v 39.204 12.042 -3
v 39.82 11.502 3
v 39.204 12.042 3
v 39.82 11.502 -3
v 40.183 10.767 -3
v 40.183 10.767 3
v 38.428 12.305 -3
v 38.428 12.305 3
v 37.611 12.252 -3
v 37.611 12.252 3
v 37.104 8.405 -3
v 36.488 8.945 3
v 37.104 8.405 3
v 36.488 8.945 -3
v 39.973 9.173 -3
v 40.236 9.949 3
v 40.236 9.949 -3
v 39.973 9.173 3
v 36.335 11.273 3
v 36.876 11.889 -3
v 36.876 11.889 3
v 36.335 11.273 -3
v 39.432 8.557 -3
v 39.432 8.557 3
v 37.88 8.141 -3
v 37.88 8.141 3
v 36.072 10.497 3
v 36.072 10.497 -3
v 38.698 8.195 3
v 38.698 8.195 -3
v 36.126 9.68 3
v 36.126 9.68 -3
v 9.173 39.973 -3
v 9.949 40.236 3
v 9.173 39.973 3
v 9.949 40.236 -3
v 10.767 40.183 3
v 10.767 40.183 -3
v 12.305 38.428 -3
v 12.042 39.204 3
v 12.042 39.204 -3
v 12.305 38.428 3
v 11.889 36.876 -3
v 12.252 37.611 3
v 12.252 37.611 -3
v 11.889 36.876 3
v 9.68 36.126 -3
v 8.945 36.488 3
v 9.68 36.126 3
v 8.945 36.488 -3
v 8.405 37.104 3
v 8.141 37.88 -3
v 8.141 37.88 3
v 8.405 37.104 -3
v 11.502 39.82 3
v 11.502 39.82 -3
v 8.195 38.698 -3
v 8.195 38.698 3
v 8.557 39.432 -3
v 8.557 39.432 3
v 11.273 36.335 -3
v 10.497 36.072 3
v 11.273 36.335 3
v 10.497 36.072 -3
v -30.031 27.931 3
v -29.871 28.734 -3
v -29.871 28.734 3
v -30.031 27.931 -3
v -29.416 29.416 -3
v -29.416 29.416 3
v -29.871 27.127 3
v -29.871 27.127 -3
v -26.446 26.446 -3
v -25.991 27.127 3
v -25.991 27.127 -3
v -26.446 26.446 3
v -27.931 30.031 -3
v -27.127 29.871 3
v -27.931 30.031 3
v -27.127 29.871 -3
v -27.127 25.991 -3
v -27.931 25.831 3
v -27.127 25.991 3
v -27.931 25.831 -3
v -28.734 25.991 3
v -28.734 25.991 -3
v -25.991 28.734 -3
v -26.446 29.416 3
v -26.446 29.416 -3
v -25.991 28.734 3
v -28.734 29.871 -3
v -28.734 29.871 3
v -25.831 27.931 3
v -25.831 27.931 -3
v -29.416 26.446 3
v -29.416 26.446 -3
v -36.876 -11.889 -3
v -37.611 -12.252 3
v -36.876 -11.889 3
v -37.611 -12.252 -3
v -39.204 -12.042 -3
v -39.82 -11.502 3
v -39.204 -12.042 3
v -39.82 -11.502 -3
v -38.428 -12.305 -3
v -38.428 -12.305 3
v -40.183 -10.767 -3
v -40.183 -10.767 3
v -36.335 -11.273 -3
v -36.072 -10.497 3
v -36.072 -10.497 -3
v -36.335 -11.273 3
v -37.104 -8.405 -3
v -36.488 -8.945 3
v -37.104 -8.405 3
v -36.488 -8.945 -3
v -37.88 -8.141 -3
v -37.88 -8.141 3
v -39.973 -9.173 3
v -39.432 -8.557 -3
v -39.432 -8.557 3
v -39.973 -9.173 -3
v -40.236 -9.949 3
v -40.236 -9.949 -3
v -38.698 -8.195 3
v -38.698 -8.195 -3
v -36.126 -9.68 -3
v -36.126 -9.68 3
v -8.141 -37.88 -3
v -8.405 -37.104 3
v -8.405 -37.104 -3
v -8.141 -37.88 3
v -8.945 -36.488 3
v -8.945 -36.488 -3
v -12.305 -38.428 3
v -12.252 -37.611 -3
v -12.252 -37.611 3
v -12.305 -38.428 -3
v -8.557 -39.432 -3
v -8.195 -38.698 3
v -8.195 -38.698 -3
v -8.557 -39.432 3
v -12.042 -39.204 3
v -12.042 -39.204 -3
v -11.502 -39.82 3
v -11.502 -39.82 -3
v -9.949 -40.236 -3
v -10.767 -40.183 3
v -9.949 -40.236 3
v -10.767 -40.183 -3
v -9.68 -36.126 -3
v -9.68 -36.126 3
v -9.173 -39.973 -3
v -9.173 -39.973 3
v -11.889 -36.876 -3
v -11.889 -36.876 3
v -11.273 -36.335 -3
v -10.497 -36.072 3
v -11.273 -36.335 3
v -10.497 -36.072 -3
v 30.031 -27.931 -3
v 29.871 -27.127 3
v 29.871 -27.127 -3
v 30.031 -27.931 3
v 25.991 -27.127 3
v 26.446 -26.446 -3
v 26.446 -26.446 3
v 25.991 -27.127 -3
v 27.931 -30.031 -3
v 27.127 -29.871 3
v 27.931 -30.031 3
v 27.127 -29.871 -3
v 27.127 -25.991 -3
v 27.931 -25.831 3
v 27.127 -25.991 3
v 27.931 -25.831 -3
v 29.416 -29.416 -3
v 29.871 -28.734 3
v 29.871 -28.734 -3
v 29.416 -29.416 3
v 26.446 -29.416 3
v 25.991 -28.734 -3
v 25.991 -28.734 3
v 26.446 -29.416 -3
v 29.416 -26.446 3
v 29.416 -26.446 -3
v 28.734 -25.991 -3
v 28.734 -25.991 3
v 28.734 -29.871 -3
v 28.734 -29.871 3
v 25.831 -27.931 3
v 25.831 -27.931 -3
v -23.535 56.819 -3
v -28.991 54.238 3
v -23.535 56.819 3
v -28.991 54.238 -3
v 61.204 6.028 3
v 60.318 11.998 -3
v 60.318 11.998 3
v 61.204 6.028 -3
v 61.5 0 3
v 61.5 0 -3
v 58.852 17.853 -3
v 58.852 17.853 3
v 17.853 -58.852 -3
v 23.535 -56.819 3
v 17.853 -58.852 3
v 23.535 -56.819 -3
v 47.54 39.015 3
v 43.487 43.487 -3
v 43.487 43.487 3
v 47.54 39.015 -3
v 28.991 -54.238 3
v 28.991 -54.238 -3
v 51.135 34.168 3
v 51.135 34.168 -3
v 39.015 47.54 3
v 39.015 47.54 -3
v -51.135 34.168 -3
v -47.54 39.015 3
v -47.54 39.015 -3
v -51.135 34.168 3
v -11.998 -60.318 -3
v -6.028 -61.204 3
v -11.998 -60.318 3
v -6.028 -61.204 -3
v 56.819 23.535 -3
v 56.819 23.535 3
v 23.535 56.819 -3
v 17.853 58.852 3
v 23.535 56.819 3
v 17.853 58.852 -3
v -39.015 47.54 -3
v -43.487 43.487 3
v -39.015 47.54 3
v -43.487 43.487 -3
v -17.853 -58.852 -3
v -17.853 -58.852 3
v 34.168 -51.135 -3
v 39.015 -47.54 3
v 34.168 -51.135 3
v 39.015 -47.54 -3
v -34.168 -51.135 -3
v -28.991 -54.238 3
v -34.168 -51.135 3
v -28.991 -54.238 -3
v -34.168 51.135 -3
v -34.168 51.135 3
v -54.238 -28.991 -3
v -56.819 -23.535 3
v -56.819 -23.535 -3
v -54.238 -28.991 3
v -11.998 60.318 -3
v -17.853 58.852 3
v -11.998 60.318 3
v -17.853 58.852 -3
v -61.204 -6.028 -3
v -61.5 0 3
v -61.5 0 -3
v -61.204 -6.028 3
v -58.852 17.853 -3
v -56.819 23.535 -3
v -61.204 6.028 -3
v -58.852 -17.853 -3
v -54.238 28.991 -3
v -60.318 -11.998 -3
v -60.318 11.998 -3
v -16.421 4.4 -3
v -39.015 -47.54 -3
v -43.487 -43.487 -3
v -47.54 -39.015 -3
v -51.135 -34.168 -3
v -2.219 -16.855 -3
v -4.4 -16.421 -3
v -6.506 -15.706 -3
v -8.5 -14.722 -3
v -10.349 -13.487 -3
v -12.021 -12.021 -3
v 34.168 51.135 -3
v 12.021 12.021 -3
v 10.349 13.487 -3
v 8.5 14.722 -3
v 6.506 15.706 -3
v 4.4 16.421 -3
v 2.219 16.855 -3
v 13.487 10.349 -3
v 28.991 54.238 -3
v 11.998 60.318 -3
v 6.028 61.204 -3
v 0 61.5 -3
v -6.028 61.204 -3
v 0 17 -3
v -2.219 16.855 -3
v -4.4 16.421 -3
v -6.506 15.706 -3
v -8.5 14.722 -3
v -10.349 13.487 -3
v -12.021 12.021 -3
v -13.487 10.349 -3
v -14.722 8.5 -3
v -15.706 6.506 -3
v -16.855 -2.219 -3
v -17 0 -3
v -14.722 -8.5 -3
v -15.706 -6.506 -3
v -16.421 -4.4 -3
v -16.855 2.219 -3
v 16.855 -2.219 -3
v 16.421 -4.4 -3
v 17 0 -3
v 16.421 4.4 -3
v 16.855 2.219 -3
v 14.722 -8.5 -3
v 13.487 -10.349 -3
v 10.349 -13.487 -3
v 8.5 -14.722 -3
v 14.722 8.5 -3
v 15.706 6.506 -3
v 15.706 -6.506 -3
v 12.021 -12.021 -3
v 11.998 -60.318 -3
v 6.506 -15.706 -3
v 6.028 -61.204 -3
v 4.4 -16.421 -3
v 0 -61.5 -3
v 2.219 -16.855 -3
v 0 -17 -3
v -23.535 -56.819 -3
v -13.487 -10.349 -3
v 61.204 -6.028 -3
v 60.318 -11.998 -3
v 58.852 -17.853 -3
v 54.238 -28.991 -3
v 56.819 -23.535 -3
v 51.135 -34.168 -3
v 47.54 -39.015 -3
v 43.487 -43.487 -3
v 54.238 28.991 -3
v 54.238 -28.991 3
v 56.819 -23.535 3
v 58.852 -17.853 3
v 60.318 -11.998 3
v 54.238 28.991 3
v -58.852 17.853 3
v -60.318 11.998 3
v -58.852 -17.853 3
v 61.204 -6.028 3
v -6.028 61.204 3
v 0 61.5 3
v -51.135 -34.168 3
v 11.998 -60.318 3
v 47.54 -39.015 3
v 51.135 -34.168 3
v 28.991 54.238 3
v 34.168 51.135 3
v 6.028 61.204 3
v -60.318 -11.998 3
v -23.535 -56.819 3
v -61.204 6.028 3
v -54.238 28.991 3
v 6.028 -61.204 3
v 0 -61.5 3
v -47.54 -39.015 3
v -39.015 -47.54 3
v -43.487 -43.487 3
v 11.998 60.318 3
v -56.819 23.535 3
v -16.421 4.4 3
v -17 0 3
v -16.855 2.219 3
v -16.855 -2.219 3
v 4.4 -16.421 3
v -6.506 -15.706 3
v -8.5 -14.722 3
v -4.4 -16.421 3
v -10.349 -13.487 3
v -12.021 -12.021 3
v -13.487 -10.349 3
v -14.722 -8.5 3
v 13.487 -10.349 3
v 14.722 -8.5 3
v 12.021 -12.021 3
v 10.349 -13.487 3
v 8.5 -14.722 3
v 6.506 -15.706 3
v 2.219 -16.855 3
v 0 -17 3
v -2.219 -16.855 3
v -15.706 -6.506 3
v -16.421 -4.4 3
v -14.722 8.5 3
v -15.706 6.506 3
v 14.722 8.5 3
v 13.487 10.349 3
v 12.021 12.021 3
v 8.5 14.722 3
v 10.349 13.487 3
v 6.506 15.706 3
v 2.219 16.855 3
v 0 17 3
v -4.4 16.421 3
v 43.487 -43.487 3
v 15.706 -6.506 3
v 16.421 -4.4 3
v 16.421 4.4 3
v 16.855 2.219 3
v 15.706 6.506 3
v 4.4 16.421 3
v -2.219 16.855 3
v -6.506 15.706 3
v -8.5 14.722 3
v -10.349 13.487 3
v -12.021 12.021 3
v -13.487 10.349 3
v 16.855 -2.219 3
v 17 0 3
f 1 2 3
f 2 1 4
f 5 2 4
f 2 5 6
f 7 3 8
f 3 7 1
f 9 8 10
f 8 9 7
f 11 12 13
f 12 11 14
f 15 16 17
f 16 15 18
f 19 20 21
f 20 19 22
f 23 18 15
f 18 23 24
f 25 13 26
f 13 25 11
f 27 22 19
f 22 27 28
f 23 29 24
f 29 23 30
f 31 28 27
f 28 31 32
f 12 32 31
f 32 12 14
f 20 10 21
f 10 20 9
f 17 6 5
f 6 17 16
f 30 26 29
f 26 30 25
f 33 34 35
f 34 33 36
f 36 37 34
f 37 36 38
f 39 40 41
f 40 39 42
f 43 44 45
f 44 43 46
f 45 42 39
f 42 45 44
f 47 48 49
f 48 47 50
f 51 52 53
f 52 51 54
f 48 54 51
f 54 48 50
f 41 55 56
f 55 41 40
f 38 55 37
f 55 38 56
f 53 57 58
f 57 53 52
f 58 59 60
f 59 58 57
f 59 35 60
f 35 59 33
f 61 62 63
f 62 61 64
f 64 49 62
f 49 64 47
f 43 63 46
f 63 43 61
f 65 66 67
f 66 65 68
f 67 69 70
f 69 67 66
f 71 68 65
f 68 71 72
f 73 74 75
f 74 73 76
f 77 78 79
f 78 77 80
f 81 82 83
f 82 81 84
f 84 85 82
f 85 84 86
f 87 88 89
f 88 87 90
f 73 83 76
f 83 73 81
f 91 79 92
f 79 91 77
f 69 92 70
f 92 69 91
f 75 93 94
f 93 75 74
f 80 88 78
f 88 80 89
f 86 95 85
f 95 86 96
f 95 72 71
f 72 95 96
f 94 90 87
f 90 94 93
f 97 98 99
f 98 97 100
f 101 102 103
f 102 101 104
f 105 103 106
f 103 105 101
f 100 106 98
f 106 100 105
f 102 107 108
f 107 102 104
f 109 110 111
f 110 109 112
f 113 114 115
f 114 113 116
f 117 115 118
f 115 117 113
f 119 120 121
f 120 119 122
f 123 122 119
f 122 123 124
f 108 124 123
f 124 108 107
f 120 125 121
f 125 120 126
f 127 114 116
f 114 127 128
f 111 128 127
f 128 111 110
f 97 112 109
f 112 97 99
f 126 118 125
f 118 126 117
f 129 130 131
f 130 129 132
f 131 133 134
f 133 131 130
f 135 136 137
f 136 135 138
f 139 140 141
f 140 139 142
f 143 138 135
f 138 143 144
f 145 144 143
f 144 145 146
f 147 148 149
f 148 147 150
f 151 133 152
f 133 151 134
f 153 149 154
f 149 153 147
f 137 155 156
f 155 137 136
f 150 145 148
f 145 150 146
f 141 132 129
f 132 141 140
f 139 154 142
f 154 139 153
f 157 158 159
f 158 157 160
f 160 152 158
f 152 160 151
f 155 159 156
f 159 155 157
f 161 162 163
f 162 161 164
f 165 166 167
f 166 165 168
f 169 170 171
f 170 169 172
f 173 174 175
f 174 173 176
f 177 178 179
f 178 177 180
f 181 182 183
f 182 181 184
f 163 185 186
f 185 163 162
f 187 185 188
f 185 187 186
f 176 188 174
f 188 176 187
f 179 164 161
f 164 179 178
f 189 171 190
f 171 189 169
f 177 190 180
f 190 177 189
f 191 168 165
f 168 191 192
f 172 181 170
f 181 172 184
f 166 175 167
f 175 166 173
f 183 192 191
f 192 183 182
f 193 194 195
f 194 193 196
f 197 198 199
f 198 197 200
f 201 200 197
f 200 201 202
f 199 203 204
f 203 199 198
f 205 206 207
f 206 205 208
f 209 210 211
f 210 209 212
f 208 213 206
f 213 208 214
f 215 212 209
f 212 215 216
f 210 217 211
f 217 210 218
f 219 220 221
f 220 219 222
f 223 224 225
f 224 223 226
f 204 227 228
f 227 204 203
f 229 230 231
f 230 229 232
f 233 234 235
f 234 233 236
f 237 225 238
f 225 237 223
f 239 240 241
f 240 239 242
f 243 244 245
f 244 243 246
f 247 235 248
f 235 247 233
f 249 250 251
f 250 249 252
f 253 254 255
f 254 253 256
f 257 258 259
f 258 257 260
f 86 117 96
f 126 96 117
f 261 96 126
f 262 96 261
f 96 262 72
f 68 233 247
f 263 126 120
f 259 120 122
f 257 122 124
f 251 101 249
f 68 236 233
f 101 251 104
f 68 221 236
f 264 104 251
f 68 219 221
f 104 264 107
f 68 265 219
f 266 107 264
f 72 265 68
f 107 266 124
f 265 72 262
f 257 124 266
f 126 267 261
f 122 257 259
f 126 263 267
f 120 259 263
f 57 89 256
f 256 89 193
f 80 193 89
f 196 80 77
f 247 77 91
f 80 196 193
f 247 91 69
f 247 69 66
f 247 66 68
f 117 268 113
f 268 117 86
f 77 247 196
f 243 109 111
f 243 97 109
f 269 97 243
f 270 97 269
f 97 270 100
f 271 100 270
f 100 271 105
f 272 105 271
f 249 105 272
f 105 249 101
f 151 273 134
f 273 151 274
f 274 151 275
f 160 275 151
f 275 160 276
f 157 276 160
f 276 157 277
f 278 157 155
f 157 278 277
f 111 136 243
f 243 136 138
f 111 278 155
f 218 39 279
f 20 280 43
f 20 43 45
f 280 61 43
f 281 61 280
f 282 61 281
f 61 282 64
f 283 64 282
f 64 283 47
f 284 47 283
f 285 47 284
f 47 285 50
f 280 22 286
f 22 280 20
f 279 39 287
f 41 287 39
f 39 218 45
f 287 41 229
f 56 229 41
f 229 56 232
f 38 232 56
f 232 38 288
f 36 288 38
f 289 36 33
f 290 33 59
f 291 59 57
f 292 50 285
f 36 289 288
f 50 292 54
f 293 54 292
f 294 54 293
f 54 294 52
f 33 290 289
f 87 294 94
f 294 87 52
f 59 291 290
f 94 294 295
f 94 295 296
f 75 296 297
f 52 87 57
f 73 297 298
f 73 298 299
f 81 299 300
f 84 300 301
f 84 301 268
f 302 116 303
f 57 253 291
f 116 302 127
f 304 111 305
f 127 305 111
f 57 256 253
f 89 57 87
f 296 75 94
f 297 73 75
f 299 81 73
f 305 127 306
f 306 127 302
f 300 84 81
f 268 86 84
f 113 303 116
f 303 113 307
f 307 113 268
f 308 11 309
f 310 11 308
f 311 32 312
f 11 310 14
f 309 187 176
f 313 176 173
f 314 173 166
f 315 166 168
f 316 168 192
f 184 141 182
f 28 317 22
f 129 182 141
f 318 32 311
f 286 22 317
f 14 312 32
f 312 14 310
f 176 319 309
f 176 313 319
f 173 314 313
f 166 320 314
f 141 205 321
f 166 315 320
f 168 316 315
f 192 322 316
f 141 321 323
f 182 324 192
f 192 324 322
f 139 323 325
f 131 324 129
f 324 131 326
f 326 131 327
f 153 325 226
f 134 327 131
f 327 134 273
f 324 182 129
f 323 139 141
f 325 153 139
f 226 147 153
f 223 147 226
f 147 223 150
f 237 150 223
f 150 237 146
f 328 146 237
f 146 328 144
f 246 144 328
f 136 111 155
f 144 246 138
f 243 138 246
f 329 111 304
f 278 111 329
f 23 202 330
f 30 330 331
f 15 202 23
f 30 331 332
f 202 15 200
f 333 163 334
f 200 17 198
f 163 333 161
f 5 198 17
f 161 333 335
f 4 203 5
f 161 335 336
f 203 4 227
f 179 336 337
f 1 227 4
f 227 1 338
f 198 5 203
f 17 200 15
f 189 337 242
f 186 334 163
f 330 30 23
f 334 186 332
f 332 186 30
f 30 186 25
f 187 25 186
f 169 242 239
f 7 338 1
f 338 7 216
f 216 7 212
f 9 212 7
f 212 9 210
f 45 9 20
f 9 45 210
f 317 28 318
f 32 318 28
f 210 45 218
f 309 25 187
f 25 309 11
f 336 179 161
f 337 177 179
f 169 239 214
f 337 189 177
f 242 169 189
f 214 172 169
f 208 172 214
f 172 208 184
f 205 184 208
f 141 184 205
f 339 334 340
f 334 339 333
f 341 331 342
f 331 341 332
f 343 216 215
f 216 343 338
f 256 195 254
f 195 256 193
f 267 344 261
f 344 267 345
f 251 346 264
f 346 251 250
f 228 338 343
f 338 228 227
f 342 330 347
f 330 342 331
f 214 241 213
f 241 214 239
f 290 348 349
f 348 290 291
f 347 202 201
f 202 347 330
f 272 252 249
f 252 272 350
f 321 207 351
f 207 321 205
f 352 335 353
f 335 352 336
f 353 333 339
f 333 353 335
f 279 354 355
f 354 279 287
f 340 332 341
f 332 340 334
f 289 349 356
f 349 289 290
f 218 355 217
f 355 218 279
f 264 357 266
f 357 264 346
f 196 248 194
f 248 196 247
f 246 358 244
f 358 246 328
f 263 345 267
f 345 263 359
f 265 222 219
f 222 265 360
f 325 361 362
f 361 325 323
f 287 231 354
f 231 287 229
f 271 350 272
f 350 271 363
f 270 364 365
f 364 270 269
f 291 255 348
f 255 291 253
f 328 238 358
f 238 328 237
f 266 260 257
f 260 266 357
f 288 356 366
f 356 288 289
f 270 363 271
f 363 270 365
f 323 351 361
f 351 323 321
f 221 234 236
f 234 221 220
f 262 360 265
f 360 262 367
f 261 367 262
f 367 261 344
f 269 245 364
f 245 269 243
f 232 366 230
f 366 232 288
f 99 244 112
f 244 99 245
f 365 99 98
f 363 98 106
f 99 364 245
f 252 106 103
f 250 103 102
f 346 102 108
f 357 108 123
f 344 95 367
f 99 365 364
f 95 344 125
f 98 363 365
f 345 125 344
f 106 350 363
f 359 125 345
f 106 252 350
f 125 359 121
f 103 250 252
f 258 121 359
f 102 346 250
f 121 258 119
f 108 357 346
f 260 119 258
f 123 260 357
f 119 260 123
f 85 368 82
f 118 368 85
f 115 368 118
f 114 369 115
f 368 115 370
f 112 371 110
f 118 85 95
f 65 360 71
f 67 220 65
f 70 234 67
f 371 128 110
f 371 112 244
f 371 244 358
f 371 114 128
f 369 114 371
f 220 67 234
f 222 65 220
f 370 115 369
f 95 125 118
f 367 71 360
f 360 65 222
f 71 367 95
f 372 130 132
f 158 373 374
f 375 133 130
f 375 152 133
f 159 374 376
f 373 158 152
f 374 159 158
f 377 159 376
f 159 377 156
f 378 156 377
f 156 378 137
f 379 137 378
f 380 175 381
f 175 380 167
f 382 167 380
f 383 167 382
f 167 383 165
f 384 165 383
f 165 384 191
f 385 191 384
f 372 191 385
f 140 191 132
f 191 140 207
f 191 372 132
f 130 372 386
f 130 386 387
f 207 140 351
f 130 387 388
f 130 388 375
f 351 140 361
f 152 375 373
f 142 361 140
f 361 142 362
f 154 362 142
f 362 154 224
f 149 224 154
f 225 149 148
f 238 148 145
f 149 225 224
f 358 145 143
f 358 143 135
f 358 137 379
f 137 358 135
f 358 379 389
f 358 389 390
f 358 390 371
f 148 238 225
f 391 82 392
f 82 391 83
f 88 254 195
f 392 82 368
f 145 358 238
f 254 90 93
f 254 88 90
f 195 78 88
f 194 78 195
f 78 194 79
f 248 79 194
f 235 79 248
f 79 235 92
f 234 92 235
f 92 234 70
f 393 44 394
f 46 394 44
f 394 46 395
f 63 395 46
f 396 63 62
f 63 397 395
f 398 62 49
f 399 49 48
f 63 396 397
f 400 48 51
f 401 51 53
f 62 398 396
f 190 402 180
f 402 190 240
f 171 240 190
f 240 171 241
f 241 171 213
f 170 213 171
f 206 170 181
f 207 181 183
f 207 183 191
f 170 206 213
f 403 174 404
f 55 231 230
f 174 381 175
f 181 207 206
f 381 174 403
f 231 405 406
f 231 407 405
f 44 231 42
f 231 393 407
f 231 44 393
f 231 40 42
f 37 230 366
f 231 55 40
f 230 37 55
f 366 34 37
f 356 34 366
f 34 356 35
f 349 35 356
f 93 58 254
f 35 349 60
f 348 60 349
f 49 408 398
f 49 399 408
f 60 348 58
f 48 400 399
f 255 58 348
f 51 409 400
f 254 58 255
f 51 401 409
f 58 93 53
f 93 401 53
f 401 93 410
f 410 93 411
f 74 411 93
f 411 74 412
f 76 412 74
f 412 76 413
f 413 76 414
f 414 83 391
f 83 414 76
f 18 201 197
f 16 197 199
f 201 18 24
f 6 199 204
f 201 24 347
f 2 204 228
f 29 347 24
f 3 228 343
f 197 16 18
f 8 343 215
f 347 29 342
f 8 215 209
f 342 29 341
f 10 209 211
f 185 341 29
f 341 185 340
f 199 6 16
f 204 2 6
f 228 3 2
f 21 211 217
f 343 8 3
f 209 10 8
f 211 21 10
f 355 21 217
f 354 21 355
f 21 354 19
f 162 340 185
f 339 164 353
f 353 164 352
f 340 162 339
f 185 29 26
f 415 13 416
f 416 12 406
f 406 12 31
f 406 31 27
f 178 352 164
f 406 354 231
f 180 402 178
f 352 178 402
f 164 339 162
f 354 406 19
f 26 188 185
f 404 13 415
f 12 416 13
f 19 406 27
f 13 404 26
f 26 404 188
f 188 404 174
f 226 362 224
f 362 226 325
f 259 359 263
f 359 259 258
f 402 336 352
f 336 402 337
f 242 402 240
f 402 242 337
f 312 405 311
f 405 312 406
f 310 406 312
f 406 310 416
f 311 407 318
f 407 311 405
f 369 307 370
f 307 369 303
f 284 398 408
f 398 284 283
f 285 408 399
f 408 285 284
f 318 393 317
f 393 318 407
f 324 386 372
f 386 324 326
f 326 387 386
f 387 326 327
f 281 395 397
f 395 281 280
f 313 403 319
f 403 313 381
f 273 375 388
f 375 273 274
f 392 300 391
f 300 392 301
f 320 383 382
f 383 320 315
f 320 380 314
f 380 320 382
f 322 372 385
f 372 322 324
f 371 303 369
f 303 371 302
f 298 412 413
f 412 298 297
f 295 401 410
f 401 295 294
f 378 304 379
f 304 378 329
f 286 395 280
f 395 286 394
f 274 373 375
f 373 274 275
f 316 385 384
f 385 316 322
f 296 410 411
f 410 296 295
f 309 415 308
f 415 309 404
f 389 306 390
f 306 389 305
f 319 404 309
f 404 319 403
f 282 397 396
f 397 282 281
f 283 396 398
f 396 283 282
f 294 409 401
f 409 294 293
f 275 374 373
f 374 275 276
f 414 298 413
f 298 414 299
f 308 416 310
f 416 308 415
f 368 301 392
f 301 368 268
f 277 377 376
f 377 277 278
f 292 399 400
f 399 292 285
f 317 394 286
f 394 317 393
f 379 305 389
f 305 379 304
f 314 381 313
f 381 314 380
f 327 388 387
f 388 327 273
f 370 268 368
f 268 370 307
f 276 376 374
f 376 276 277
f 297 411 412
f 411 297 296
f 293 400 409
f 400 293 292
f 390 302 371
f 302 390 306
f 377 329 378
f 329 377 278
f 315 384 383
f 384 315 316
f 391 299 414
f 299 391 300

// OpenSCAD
/*
 * CLEAR_VIEWPORT.scad
 * Optional clear top plate (print in clear PETG) so you can observe the beautiful
 * inward spiral flow during low-pressure air tests.
 * Also functions as a solid cover when swapped with the printed version.
 * From the May 2026 Grok design conversation.
 */

module clear_viewport() {
    difference() {
        cylinder(d=95 + 28, h=6, center=true, $fn=64);
        // Central opening (match HVAT / diffuser)
        cylinder(d=28 + 6, h=7, center=true, $fn=48);
        
        // Bolt holes matching platter pattern (6x)
        for (i = [0:5]) {
            rotate([0,0,i*60 + 15])
                translate([95/2 - 8, 0, 0])
                    cylinder(d=4.2, h=8, center=true, $fn=16);
        }
    }
}

clear_viewport();
